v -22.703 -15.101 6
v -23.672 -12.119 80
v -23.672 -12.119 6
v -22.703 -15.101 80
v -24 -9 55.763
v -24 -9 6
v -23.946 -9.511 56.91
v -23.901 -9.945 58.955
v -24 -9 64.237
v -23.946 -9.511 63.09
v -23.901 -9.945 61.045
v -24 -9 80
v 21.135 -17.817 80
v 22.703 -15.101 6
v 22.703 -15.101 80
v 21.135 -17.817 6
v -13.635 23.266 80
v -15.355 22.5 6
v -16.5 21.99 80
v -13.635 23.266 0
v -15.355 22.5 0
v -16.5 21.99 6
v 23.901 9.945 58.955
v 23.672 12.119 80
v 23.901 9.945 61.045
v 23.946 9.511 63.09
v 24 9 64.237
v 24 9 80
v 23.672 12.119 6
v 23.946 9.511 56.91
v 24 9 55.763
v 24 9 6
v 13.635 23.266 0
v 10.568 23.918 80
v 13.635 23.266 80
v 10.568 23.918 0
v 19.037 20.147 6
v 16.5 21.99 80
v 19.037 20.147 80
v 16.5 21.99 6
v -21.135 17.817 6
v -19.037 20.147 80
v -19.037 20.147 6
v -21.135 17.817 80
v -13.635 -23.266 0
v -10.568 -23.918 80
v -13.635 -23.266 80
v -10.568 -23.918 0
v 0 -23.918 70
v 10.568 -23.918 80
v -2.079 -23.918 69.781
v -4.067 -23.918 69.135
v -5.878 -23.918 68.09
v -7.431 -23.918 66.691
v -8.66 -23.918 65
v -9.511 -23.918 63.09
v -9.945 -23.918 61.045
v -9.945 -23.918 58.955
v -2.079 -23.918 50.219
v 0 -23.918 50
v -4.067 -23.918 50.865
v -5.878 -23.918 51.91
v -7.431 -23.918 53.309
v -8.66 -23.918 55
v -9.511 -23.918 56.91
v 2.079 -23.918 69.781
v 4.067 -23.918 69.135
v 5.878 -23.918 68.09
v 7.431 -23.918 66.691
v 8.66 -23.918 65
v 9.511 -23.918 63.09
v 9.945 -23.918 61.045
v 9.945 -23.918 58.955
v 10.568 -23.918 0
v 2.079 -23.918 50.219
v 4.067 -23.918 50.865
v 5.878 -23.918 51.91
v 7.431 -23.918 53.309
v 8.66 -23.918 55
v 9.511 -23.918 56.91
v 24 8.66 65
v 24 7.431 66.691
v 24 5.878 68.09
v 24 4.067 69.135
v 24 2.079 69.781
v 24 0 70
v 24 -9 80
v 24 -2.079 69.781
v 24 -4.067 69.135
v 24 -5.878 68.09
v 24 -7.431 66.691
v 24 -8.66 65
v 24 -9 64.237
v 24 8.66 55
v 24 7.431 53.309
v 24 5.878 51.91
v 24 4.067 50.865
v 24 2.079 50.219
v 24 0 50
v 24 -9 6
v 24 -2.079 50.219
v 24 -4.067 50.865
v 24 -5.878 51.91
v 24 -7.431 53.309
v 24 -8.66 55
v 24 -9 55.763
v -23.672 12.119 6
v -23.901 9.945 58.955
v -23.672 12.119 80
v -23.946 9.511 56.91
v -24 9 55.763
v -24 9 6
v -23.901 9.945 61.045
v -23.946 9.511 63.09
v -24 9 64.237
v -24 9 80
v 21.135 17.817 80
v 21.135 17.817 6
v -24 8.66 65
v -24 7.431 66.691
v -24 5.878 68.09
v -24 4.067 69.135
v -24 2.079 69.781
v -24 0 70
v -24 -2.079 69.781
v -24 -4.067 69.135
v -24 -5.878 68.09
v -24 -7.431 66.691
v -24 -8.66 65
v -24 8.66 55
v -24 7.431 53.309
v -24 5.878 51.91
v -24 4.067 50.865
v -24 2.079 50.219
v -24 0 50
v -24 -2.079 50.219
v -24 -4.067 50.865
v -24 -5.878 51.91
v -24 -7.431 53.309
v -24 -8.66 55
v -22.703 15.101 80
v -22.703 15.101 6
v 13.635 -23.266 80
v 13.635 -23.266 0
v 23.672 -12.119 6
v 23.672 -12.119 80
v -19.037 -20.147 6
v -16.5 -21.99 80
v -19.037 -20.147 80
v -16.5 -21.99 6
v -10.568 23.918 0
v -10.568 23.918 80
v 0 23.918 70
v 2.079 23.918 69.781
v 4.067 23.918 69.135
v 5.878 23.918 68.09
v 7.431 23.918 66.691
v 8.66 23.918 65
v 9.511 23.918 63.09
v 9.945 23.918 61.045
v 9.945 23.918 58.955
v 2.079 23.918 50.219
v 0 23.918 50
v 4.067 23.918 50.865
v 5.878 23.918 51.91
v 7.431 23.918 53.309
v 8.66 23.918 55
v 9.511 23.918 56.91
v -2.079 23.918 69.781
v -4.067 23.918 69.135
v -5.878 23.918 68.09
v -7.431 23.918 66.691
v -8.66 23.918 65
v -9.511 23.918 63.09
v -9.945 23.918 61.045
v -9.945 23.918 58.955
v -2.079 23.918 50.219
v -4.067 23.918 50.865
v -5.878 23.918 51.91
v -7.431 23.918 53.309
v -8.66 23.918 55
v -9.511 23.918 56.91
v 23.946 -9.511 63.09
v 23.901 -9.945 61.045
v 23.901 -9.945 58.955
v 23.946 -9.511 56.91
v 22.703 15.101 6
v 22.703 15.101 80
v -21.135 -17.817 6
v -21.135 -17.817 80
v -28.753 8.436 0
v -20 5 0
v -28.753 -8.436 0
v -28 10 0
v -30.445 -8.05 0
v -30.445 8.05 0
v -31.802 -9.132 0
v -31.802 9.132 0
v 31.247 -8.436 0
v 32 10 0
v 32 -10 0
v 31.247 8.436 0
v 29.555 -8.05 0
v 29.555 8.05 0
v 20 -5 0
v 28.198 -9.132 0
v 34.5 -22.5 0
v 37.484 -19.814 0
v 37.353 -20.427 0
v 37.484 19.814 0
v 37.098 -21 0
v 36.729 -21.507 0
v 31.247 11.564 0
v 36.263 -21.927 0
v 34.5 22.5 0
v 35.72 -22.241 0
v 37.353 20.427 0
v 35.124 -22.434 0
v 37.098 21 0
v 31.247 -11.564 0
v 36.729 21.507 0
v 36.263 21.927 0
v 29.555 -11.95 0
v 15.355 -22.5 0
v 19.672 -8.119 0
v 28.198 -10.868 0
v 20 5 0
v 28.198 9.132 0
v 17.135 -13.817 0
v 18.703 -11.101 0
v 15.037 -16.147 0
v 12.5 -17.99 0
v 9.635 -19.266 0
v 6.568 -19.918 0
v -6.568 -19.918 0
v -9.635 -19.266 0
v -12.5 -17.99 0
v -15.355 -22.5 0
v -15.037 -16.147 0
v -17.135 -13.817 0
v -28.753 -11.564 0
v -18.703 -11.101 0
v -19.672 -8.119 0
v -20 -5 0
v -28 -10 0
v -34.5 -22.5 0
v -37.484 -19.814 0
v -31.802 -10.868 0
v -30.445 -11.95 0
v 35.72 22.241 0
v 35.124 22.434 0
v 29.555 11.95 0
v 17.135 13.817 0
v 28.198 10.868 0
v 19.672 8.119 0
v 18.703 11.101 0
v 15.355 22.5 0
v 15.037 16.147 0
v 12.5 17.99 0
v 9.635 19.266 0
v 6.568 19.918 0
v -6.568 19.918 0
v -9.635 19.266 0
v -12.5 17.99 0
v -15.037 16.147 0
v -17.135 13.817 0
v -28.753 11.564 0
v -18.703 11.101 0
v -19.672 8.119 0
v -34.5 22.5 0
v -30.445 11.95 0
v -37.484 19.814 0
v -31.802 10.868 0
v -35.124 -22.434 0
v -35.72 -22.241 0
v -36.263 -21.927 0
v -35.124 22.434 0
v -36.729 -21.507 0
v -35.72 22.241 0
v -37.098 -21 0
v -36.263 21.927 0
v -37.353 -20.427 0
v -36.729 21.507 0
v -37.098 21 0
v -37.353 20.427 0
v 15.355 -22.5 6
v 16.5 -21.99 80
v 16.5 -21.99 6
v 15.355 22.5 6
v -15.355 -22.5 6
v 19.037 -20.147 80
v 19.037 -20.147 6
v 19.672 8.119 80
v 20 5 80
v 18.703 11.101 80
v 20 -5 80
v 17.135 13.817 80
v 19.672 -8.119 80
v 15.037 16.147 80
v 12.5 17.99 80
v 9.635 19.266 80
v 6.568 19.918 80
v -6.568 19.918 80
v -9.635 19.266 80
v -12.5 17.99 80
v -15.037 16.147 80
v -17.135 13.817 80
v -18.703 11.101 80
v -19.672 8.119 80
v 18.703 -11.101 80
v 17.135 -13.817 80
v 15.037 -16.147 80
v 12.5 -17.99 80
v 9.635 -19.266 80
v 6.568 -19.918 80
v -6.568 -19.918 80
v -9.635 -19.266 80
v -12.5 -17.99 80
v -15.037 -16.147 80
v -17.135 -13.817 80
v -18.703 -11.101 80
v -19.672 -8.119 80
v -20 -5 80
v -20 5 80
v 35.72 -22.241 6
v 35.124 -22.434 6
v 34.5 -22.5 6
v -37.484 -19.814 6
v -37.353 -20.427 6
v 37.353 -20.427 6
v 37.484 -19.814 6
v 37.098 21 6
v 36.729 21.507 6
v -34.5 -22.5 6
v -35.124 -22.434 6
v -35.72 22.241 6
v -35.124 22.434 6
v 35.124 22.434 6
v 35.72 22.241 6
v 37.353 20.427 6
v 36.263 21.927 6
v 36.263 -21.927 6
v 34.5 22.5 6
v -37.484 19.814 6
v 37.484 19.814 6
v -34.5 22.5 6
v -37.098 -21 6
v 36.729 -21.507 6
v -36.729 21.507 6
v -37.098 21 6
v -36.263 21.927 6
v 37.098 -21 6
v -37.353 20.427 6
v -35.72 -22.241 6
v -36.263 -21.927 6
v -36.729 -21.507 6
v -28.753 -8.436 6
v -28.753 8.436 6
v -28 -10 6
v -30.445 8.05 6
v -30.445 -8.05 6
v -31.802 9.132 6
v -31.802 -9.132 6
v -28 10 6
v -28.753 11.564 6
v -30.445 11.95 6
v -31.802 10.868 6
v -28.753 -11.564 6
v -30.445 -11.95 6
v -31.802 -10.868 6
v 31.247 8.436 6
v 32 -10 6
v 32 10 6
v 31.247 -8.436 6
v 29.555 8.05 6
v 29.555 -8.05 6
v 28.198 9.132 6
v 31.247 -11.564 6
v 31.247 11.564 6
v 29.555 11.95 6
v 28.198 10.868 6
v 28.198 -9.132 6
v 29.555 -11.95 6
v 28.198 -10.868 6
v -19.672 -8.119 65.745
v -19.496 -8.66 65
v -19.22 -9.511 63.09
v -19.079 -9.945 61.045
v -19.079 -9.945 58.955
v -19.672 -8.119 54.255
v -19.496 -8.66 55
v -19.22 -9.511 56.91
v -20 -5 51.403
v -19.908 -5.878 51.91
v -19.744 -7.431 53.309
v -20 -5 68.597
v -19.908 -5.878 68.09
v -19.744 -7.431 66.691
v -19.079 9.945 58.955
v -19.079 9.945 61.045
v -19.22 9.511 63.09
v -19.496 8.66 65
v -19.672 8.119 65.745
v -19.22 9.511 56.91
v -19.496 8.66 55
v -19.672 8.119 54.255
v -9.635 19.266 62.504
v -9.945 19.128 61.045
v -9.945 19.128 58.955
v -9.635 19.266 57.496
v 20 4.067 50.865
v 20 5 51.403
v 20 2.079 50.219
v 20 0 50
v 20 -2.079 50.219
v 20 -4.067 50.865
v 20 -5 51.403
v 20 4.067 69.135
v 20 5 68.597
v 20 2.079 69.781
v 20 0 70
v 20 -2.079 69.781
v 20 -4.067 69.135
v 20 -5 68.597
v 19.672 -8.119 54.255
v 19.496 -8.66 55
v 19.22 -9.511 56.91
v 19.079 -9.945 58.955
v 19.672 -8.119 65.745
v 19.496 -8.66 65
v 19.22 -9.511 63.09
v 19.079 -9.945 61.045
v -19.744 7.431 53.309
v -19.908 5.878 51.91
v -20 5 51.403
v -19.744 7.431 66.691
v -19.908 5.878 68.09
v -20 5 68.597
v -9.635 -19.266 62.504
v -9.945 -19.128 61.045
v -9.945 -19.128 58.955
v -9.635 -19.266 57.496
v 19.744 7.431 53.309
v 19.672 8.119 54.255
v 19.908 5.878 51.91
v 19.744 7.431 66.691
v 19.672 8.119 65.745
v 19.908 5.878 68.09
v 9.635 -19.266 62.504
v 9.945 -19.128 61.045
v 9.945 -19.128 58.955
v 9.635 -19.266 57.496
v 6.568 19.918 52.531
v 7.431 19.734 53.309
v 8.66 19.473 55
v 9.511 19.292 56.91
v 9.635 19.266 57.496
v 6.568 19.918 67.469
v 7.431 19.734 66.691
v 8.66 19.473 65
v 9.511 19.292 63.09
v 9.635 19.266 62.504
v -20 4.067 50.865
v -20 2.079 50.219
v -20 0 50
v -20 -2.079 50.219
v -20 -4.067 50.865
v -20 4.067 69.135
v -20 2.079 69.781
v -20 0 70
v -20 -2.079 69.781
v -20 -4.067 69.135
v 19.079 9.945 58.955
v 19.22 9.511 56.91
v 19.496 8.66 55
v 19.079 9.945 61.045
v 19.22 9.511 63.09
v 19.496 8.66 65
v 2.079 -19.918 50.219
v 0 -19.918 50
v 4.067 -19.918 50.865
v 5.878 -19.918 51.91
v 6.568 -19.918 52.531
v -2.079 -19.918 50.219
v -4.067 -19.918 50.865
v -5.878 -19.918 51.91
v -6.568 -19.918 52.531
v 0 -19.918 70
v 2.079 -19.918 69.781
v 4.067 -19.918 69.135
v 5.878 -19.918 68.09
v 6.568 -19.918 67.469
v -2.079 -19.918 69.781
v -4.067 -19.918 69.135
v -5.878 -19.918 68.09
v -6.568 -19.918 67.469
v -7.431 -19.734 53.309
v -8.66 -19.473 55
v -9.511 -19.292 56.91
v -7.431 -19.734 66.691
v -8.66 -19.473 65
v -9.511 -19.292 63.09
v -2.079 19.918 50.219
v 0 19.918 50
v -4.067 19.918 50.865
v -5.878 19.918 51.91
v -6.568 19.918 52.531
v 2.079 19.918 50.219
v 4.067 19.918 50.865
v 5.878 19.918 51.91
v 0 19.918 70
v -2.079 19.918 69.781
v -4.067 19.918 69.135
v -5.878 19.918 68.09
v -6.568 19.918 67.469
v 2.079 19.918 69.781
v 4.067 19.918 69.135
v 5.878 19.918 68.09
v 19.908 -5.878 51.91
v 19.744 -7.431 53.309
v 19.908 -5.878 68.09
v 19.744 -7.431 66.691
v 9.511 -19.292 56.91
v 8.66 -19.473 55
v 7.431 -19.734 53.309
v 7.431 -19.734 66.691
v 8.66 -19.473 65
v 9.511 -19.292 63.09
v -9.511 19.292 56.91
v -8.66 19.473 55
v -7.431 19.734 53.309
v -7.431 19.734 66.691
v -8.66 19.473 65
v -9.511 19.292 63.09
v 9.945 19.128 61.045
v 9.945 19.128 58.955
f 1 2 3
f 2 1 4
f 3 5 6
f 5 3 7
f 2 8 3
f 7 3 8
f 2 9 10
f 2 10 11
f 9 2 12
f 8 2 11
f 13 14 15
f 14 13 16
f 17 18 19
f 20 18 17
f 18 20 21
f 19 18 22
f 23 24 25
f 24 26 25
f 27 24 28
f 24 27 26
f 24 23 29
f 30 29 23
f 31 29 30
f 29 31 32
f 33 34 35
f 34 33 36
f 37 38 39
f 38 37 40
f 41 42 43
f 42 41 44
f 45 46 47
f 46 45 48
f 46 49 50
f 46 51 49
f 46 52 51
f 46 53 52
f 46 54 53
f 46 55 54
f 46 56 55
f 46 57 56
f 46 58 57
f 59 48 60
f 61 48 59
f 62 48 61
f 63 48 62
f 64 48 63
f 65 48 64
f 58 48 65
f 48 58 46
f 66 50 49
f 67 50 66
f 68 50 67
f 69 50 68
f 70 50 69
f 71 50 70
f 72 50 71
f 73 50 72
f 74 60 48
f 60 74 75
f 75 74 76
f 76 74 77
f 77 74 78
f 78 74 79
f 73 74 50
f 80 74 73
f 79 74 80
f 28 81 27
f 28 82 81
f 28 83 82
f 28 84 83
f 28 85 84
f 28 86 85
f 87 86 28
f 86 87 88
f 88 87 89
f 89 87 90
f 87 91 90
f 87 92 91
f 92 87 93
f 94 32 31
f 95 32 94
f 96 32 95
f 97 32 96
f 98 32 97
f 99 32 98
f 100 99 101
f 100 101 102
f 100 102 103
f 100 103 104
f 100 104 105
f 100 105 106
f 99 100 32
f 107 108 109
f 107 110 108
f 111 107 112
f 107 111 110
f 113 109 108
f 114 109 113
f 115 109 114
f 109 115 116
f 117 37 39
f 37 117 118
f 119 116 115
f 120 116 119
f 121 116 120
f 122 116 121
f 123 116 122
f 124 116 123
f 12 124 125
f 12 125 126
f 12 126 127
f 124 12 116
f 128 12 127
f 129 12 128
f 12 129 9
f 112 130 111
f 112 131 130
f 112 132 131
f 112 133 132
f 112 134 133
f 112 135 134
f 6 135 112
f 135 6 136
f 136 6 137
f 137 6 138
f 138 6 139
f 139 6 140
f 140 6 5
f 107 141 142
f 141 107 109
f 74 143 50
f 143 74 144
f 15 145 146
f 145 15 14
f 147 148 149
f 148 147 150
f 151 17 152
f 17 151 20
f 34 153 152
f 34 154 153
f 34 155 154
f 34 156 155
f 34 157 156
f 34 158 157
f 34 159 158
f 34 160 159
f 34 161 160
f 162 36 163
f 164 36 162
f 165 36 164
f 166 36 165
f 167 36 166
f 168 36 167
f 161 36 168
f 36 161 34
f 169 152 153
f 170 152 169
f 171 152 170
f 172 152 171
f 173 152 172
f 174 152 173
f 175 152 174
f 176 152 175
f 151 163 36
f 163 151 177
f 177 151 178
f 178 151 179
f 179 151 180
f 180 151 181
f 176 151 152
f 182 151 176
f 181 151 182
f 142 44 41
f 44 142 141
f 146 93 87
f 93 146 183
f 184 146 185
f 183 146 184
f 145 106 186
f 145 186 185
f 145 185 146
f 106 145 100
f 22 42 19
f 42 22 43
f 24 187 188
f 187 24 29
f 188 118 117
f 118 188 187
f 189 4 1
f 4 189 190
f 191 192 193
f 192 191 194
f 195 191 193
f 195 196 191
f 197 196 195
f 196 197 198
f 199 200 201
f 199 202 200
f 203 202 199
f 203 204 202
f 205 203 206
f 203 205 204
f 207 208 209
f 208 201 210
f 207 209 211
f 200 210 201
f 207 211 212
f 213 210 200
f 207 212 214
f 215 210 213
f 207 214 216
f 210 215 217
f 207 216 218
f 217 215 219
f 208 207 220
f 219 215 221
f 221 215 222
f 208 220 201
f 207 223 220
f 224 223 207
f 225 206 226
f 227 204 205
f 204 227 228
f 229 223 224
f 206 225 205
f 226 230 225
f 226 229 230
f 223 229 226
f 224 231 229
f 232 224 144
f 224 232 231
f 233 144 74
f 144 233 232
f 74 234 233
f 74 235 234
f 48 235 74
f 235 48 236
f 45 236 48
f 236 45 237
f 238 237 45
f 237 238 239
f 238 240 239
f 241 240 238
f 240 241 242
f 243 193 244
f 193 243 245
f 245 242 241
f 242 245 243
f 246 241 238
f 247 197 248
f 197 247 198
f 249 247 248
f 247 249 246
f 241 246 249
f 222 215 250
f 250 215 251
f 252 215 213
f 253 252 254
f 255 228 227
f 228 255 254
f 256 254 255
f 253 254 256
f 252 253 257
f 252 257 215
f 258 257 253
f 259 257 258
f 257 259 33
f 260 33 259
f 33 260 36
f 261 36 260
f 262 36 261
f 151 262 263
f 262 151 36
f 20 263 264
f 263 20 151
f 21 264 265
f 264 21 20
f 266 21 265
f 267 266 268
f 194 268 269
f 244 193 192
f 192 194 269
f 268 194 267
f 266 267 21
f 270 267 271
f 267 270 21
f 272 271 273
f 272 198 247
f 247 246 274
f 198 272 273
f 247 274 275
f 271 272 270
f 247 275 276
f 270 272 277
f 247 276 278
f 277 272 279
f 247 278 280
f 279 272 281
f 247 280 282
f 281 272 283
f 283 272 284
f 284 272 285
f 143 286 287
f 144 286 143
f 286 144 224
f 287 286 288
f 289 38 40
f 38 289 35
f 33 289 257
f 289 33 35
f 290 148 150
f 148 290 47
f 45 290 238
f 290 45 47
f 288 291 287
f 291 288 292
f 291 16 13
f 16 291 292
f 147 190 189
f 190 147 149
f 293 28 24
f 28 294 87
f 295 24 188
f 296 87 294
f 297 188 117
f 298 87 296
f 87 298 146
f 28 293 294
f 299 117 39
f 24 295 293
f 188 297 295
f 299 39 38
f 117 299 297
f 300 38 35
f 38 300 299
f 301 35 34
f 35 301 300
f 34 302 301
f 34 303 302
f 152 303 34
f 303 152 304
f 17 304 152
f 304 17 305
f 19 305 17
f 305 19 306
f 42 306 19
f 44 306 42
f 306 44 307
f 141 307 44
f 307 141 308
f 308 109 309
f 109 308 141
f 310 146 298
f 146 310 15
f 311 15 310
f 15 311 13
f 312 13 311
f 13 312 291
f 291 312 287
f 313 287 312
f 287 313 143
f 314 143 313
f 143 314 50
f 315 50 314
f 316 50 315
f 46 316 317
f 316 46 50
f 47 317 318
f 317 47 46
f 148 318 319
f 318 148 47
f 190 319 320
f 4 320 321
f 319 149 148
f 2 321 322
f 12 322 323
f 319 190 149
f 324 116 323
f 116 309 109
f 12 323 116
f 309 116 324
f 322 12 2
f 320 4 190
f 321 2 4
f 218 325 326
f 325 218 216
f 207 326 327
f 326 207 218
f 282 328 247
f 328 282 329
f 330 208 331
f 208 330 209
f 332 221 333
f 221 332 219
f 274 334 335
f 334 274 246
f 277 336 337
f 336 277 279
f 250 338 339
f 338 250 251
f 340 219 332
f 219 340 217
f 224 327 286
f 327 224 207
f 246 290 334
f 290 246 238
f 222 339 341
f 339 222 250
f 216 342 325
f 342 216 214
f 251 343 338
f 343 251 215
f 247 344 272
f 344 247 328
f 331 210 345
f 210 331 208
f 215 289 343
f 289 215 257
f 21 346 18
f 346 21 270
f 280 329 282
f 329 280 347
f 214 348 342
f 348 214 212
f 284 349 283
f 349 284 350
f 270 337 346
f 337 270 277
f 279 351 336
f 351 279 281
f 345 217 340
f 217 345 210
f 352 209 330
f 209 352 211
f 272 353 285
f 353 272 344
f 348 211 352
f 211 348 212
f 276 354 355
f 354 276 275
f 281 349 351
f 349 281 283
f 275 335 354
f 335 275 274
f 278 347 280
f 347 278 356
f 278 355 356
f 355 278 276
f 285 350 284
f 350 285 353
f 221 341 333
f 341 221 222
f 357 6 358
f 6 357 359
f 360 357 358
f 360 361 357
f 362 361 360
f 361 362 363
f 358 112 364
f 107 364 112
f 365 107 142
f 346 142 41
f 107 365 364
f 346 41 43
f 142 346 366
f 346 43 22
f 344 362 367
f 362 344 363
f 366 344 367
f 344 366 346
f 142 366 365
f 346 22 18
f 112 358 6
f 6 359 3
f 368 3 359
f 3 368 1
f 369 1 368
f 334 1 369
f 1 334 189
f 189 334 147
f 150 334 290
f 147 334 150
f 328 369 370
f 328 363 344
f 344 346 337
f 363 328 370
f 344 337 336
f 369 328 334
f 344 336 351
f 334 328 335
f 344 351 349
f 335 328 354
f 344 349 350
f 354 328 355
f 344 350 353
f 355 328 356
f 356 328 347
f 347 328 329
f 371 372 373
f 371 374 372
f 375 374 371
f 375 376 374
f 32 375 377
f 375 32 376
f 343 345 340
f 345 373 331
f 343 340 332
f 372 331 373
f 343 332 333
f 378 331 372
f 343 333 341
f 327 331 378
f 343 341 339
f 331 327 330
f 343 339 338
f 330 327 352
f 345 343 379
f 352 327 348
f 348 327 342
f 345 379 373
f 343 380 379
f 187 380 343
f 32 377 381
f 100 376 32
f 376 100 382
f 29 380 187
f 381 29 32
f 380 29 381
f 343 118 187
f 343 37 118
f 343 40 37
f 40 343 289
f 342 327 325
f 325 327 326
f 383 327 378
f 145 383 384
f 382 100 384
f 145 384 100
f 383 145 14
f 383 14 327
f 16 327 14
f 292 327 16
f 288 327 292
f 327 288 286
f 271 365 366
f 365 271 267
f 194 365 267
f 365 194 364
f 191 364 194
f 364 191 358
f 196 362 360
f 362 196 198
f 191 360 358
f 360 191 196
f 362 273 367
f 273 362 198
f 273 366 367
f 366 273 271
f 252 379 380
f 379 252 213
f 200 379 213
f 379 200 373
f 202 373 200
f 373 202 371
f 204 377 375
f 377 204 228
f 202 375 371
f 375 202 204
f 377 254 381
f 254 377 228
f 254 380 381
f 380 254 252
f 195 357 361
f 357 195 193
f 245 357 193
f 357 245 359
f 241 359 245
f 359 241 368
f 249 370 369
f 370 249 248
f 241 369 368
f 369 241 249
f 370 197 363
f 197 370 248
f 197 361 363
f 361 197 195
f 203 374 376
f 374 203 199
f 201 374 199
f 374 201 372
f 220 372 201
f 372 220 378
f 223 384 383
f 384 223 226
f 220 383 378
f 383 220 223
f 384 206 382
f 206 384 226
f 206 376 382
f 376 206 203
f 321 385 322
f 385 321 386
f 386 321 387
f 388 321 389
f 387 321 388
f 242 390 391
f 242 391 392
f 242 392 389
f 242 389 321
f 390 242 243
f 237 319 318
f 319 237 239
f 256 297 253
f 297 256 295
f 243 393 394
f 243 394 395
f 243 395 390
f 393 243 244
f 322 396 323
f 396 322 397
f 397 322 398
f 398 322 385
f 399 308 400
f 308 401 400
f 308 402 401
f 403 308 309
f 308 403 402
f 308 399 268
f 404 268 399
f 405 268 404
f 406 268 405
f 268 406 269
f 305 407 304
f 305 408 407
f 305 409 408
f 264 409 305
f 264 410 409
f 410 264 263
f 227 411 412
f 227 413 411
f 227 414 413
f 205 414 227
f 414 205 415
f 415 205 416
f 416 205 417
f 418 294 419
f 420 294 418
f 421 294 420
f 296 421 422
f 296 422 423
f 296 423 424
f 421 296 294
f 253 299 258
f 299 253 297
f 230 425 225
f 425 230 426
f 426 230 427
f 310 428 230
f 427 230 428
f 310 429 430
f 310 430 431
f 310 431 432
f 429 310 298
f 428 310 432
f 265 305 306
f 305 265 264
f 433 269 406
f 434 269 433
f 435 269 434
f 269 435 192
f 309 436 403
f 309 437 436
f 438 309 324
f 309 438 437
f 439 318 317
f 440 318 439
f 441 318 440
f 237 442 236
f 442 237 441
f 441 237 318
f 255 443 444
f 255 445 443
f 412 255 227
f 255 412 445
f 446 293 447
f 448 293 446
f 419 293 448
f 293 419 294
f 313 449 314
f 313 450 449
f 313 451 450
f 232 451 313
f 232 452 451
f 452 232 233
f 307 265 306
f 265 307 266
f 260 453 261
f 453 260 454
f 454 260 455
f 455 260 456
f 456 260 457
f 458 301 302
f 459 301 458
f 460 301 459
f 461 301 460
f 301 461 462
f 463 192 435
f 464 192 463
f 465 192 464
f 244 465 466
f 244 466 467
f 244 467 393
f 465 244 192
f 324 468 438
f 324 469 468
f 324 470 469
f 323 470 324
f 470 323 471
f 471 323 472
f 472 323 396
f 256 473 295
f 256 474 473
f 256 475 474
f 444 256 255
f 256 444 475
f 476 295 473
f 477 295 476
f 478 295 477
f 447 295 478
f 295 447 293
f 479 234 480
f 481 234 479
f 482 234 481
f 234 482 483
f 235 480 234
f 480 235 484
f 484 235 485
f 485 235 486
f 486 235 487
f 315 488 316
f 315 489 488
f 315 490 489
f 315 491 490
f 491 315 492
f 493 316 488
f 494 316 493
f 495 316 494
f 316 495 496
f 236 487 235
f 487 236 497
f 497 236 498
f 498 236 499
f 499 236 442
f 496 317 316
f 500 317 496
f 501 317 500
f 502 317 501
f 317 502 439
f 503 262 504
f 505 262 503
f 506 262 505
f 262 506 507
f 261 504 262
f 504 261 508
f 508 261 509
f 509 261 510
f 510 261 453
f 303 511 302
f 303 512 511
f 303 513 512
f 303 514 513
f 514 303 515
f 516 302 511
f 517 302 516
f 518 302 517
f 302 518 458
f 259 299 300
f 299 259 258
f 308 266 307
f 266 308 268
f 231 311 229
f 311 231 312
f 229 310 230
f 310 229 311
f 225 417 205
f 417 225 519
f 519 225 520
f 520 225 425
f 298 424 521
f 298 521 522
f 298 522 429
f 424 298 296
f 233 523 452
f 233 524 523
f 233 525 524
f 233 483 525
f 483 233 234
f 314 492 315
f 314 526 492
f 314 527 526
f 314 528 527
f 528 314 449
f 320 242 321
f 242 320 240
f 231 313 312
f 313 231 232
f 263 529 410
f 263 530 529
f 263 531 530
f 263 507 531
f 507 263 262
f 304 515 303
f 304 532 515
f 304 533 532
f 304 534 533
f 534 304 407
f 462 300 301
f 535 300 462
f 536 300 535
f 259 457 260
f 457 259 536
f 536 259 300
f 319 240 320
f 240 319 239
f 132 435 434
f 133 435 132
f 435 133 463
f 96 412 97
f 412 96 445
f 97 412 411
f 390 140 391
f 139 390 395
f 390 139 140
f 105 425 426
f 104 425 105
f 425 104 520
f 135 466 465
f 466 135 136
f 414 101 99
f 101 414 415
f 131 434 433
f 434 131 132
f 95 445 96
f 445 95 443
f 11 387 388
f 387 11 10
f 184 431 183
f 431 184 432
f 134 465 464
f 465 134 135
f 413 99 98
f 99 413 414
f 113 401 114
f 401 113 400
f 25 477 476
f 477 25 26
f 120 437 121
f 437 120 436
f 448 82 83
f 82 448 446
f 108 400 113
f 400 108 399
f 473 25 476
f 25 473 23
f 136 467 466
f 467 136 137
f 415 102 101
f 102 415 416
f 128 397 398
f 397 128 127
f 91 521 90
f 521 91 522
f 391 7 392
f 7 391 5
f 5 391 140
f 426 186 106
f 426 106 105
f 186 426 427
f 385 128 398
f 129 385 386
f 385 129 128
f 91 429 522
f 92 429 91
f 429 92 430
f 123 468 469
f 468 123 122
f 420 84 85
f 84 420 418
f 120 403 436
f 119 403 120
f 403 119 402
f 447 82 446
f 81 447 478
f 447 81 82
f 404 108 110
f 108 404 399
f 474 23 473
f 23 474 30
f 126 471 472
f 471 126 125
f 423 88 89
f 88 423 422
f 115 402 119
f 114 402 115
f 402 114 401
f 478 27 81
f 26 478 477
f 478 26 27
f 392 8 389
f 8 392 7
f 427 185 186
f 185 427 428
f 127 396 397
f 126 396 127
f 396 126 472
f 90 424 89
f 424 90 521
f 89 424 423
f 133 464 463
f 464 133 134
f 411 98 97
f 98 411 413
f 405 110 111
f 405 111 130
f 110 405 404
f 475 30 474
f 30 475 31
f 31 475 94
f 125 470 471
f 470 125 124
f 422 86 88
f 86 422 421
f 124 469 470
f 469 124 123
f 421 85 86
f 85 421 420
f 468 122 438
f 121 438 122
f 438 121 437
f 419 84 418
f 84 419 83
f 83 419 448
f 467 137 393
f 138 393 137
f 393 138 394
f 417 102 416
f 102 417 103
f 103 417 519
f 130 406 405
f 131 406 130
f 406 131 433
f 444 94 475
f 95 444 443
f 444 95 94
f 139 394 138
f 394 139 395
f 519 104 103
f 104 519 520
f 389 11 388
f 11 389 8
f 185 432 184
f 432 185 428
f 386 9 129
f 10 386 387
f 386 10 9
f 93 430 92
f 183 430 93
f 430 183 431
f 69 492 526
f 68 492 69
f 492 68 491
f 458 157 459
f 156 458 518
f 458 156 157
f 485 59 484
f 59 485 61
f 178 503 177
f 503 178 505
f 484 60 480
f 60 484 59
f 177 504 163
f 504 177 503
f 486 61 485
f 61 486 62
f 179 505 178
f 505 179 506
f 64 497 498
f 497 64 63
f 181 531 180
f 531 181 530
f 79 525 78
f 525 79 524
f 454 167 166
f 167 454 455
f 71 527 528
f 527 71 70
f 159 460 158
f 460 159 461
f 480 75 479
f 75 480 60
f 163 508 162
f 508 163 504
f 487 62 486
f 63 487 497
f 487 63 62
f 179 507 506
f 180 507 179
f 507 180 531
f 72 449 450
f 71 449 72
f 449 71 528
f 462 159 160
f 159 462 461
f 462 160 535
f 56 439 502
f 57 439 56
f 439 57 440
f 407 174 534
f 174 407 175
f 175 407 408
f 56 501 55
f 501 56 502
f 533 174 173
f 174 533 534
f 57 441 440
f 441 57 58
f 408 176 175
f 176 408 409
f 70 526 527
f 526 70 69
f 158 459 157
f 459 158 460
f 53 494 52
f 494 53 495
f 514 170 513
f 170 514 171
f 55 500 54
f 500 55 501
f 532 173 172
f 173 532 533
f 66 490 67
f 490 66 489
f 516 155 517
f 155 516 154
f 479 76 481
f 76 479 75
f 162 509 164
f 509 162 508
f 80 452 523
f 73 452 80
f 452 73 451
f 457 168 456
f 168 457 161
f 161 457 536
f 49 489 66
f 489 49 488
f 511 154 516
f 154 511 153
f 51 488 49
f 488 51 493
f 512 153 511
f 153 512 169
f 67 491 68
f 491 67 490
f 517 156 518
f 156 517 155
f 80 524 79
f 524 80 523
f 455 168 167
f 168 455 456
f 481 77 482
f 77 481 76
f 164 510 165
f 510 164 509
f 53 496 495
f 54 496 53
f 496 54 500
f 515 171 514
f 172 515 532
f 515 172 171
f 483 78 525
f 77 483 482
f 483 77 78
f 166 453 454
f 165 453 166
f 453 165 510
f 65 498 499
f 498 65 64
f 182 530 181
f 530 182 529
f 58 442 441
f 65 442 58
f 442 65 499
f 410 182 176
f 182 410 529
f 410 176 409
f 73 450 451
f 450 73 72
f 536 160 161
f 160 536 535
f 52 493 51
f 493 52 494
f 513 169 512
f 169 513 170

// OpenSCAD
include <iphone4_model.scad>;
wallthickness=8;

assembled=false;

module boltholes(){
union (){
translate ([0,0,6]) cylinder (20,2,2);//hole
translate ([60,0,9]) cylinder (20,2,2);//hole
translate([0,0,7]) cylinder (5,5,5);//head
translate ([60,0,7]) cylinder (5,5,5);//head
}}

module hitch_mount(){
difference(){
union (){
roundedRect([48	, 48,  80], 15);//outer hitch wall
translate ([0,0,0]) rotate ([0,0,90]) roundedRect ([45,75,6],3); //bolt plate mount
}
union (){
translate ([0,0,-1]) roundedRect([48-wallthickness	, 48-wallthickness,  85], 15);//inner hitch wall
translate ([-25,0,60,]) rotate ([0,90,0])cylinder (50,10,10);//hitch pin hole
translate ([0,-25,60,]) rotate ([0,90,90])cylinder (50,10,10);//other hitch pin hole
translate ([-30,10,-15]) boltholes(); //boltholes for mounting
translate ([-30,-10,-15])  boltholes(); //bolt holes for mounting
}
}}




hitch_mount();

/*
module iphoneholder(){

  difference(){
    union(){
      translate ([0,0,0])    scale ([1.05,1.1,1.1]) iphone4(
      show_connector=false,
      show_buttons=false,
      show_front=false,
      show_flush=false,
      show_misc_side=false);
      translate ([0,0,-5])    scale ([1.05,1.1,1.1]) iphone4(
      show_connector=false,
      show_buttons=false,
      show_front=false,
      show_flush=false,
      show_misc_side=false);
    }
    union() //add shapes for cutaway
    {
      //actual phone to cut out
      translate([0,0,-1]) scale ([1.02,1.05,1.05])iphone4(
      show_connector=false,
      show_buttons=false,
      show_front=false,
      show_flush=false,
      show_misc_side=false);
      translate([0,0,2]) scale ([1.02,1.05,1.05])iphone4(
      show_connector=false,
      show_buttons=false,
      show_front=false,
      show_flush=false,
      show_misc_side=false);
      translate ([5,0,5]) rotate ([90,0,90]) roundedRect ([28,6,60],3); //dock connector
	  translate ([30,10,8]) rotate ([0,180,0]) boltholes(); //boltholes for mounting
      translate ([30,-10,8])  rotate ([0,180,0]) boltholes(); //bolt holes for mounting	
translate ([-22,-29,-3]) cube ([45,60,4]);
translate ([-52,-29,-3]) cube ([15,60,4]);
translate ([38,-29,-3]) cube ([15,60,4]);
translate ([-50,-29,-3]) cube ([90,12,4]);
translate ([-50,19,-3]) cube ([90,12,4]);
    }
}}

if (assembled){
translate ([0,0,11]) rotate([180,0,0]) iphoneholder();
translate ([0,0,16])hitch_mount();
}

if (!assembled){ //view for export to stl 
translate ([0,0,5]) rotate ([0,0,0]) iphoneholder();
translate ([0,60,0]) hitch_mount();
}
*/
